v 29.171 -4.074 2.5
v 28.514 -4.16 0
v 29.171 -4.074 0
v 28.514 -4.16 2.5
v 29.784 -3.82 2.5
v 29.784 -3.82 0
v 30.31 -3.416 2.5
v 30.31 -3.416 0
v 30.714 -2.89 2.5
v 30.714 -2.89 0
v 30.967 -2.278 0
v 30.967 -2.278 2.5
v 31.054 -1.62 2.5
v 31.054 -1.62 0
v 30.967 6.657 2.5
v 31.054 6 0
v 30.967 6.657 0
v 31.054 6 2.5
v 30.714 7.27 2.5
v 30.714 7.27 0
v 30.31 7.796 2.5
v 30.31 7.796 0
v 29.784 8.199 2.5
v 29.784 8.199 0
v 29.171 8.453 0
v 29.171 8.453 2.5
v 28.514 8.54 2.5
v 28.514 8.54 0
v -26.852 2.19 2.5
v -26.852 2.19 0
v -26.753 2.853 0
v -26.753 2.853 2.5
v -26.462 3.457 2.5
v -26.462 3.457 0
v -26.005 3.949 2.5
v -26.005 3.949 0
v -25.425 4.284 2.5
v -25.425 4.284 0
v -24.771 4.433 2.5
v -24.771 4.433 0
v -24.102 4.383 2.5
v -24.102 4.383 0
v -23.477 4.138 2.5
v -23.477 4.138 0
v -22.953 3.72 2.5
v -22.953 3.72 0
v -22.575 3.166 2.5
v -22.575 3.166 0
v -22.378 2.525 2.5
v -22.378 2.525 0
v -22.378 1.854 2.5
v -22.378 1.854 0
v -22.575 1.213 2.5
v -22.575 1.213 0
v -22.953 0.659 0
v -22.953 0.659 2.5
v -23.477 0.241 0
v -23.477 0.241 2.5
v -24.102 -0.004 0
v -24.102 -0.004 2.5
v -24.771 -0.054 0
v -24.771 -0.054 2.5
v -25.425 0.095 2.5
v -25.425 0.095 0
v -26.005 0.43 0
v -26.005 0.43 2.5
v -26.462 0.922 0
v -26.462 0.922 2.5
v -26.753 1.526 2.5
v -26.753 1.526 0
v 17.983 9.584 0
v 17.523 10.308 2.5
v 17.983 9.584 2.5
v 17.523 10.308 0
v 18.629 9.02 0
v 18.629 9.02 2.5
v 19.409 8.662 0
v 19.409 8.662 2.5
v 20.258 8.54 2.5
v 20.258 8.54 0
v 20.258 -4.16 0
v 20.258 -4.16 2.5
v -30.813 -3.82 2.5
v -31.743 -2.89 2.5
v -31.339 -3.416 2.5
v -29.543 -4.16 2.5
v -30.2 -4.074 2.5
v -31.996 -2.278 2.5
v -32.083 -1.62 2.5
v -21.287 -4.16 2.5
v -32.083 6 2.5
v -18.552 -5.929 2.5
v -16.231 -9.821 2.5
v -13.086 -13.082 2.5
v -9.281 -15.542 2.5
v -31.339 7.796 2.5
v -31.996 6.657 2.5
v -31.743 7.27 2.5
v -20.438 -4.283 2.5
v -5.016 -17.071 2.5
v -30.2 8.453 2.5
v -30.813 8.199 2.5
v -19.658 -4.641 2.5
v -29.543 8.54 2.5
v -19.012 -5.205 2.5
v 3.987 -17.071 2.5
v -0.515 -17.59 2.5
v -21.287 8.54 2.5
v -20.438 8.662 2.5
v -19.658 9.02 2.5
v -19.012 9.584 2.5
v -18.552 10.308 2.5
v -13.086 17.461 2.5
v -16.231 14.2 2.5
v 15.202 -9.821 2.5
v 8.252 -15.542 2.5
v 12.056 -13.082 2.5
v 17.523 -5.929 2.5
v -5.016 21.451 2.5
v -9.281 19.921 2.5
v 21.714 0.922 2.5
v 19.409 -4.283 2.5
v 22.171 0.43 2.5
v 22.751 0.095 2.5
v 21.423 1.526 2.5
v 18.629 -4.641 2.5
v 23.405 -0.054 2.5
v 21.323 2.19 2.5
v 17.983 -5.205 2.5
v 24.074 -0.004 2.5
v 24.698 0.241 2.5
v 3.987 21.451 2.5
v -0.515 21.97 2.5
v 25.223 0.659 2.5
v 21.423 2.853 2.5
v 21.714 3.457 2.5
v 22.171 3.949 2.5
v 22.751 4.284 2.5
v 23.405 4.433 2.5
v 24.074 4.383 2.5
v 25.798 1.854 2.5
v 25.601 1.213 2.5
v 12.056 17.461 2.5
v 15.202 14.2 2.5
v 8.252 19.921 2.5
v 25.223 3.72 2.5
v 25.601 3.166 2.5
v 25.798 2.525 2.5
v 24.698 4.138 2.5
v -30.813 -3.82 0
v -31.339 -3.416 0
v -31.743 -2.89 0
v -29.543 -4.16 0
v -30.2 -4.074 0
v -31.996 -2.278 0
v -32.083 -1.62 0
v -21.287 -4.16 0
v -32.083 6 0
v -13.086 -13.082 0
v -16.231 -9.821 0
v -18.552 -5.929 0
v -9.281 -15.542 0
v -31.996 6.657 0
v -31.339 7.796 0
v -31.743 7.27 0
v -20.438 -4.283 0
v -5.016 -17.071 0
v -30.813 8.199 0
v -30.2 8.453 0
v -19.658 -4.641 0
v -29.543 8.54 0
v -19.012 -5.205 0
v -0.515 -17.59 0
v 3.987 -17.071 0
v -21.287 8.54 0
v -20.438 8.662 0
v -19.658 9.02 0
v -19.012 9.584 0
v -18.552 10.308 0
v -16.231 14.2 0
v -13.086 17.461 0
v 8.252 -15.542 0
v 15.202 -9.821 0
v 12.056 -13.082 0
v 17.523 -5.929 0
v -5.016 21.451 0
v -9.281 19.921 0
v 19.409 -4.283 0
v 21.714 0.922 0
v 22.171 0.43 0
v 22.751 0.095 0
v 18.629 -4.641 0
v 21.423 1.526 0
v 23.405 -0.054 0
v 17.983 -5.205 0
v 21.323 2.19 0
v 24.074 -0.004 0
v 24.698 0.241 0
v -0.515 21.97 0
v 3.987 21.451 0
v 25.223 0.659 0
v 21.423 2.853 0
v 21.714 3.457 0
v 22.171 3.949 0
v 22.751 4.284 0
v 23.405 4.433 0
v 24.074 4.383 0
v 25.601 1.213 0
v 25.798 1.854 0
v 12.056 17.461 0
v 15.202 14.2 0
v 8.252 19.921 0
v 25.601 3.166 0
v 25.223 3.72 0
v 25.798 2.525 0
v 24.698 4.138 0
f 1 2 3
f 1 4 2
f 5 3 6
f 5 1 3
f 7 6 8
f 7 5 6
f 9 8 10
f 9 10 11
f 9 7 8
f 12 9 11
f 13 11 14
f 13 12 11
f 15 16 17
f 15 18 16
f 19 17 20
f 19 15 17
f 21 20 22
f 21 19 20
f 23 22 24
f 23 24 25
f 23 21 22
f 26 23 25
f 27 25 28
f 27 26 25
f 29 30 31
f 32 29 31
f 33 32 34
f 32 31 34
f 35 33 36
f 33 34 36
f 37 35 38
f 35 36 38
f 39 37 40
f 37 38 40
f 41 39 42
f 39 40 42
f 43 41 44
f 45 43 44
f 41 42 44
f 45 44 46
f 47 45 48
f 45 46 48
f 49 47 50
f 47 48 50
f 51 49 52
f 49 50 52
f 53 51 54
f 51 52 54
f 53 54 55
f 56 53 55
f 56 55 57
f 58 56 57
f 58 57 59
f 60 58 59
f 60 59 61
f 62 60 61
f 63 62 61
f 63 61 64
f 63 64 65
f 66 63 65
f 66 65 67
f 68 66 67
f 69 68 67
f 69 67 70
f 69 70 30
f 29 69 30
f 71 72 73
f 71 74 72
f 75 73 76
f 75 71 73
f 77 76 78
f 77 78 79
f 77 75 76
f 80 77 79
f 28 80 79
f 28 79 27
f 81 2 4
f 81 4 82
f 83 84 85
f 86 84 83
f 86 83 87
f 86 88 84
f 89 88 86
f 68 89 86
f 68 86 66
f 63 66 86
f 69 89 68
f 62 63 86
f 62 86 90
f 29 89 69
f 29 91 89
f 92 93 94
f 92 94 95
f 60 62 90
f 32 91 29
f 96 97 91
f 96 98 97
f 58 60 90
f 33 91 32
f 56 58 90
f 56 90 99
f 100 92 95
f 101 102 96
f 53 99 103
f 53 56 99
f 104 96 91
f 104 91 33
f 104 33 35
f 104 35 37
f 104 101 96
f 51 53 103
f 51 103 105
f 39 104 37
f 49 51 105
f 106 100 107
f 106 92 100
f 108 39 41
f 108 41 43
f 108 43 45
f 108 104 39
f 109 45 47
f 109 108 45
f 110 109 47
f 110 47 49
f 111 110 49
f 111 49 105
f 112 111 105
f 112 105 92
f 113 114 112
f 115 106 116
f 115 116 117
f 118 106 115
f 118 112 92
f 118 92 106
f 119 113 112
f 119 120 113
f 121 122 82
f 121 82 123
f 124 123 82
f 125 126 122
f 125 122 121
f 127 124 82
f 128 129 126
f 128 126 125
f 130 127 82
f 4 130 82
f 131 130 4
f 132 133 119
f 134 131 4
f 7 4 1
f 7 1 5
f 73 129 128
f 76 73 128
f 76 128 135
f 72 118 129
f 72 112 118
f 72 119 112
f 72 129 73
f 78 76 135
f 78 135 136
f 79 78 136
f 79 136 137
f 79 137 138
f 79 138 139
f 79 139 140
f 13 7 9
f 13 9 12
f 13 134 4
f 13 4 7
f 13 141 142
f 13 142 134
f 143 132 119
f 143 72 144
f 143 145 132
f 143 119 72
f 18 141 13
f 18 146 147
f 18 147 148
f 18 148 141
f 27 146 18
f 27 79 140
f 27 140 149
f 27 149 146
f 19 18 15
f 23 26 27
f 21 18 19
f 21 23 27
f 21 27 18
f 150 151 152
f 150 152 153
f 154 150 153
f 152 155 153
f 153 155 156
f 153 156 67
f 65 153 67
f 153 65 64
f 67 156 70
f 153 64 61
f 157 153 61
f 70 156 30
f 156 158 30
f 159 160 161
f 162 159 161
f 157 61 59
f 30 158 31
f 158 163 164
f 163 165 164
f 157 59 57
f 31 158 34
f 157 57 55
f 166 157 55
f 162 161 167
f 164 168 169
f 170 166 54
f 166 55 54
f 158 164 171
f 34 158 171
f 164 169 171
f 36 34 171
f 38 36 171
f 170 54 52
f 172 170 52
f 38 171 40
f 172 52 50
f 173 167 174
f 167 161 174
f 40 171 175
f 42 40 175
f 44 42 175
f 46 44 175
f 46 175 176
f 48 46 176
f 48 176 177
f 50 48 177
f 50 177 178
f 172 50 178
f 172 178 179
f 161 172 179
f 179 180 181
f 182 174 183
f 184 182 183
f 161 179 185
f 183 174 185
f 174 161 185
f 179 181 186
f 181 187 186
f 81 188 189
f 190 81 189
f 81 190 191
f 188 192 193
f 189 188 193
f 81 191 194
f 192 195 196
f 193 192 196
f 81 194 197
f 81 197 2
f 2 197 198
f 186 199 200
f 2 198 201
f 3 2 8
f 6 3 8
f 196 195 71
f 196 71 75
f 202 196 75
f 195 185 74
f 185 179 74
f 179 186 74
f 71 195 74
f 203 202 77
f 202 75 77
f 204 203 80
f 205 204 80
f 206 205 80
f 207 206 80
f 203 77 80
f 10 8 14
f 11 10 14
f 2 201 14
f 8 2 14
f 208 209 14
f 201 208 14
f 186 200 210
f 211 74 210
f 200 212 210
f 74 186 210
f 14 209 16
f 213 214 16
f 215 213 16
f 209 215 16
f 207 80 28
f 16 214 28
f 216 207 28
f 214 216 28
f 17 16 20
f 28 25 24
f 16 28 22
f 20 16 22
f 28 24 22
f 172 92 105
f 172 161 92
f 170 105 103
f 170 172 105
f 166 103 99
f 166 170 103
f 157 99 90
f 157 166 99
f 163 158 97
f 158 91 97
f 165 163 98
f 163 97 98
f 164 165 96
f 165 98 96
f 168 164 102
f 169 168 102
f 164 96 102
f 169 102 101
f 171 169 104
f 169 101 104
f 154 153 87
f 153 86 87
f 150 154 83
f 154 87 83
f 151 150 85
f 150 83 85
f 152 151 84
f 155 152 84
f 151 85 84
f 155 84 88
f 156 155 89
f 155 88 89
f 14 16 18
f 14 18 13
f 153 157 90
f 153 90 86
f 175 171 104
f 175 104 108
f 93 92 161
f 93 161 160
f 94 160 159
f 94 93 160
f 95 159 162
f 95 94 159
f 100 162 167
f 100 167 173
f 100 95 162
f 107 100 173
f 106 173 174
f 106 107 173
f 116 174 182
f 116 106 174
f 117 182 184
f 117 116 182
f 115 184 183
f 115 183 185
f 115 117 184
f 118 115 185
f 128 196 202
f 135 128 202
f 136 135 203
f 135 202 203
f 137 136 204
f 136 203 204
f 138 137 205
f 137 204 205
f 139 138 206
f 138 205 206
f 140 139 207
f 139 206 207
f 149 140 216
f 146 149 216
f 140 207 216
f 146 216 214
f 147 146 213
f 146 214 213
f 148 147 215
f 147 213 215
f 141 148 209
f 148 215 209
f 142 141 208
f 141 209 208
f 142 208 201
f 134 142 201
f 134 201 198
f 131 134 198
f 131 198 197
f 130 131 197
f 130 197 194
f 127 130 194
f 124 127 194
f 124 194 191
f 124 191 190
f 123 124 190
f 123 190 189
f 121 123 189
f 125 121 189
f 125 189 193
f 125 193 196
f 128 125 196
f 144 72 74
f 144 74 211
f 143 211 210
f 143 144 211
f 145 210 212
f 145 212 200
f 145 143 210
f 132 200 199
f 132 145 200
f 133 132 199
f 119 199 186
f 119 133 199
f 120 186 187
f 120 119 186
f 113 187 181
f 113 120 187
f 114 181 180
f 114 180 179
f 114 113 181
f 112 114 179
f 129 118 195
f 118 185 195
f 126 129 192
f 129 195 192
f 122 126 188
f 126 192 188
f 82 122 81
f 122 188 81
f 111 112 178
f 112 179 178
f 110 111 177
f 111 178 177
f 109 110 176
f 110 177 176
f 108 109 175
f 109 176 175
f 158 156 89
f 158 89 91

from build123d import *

# Parameters (mm, degrees)
BOSS_EXTRUDE1_DEPTH   = 2.5
FILLET1_R             = 2.54
M4_CLEARANCE_HOLE1_D  = 4.5
BOSS_EXTRUDE2_DEPTH   = 2.5
BOSS_EXTRUDE2_2_DEPTH = 2.5
FILLET2_R             = 3


with BuildPart() as part:
    # Sketch1 → Boss-Extrude1 (new body)
    with BuildSketch(Plane(origin=(0, 0, 0), x_dir=(-1, 0, 0), z_dir=(0, 0, 1))):
        with BuildLine():
            ThreePointArc((17.121950758, 4.160440607), (0.514545783, 15.590440607), (-16.092859192, 4.160440607))
            Line((-16.092859192, 4.160440607), (-31.053947254, 4.160440607))
            Line((-31.053947254, 4.160440607), (-31.053947254, -8.539559393))
            Line((-31.053947254, -8.539559393), (-16.092859192, -8.539559393))
            ThreePointArc((-16.092859192, -8.539559393), (0.514545783, -19.969559393), (17.121950758, -8.539559393))
            Line((17.121950758, -8.539559393), (32.08303882, -8.539559393))
            Line((32.08303882, -8.539559393), (32.08303882, 4.160440607))
            Line((32.08303882, 4.160440607), (17.121950758, 4.160440607))
        make_face()
    extrude(amount=BOSS_EXTRUDE1_DEPTH)

    # Fillet1
    fillet1_edges = [part.edges().sort_by_distance(p)[0] for p in [
        (16.092859192, 8.539559393, 1.25),
        (-17.121950758, 8.539559393, 1.25),
        (-17.121950758, -4.160440607, 1.25),
        (16.092859192, -4.160440607, 1.25),
        (-32.08303882, -4.160440607, 1.25),
        (-32.08303882, 8.539559393, 1.25),
        (31.053947254, 8.539559393, 1.25),
        (31.053947254, -4.160440607, 1.25),
    ]]
    fillet(fillet1_edges, radius=FILLET1_R)

    # M4 Clearance Hole1 (through all)
    with Locations(Plane.XY.offset(2.5)):
        with Locations((-24.602494789, 2.189559393), (23.573403223, 2.189559393)):
            Hole(M4_CLEARANCE_HOLE1_D / 2)


with BuildPart() as body_2:
    # Sketch4 → Boss-Extrude2 (new body)
    with BuildSketch(Plane.XY.offset(2.5)):
        with BuildLine():
            Line((17.757572321, 8.539559393), (18.218470525, 8.539559393))
            ThreePointArc((18.218470525, 8.539559393), (-0.514545783, 21.969559393), (-19.247562091, 8.539559393))
            Line((-19.247562091, 8.539559393), (-18.786663887, 8.539559393))
            ThreePointArc((-18.786663887, 8.539559393), (-17.439625469, 8.926169624), (-16.502649124, 9.968309393))
            ThreePointArc((-16.502649124, 9.968309393), (-0.514545783, 19.969559393), (15.473557558, 9.968309393))
            ThreePointArc((15.473557558, 9.968309393), (16.410533903, 8.926169624), (17.757572321, 8.539559393))
        make_face()
    extrude(amount=-BOSS_EXTRUDE2_DEPTH)


with BuildPart() as body_3:
    # Sketch4 → Boss-Extrude2 2 (new body)
    with BuildSketch(Plane.XY.offset(2.5)):
        with BuildLine():
            ThreePointArc((-19.247562091, -4.160440607), (-0.514545783, -17.590440607), (18.218470525, -4.160440607))
            Line((18.218470525, -4.160440607), (17.757572321, -4.160440607))
            ThreePointArc((17.757572321, -4.160440607), (16.410533903, -4.547050837), (15.473557558, -5.589190607))
            ThreePointArc((15.473557558, -5.589190607), (-0.514545783, -15.590440607), (-16.502649124, -5.589190607))
            ThreePointArc((-16.502649124, -5.589190607), (-17.439625469, -4.547050837), (-18.786663887, -4.160440607))
            Line((-18.786663887, -4.160440607), (-19.247562091, -4.160440607))
        make_face()
    extrude(amount=-BOSS_EXTRUDE2_2_DEPTH)


with BuildPart() as part_1:
    add(part.part)

    # Combine1: union body 2, body 3
    add(body_2.part)
    add(body_3.part)

    # Fillet2
    fillet2_edges = [part_1.edges().sort_by_distance(p)[0] for p in [
        (18.218470525, -4.160440607, 1.25),
        (18.218470525, 8.539559393, 1.25),
        (-19.247562091, -4.160440607, 1.25),
        (-19.247562091, 8.539559393, 1.25),
    ]]
    fillet(fillet2_edges, radius=FILLET2_R)


solid = part_1.part
